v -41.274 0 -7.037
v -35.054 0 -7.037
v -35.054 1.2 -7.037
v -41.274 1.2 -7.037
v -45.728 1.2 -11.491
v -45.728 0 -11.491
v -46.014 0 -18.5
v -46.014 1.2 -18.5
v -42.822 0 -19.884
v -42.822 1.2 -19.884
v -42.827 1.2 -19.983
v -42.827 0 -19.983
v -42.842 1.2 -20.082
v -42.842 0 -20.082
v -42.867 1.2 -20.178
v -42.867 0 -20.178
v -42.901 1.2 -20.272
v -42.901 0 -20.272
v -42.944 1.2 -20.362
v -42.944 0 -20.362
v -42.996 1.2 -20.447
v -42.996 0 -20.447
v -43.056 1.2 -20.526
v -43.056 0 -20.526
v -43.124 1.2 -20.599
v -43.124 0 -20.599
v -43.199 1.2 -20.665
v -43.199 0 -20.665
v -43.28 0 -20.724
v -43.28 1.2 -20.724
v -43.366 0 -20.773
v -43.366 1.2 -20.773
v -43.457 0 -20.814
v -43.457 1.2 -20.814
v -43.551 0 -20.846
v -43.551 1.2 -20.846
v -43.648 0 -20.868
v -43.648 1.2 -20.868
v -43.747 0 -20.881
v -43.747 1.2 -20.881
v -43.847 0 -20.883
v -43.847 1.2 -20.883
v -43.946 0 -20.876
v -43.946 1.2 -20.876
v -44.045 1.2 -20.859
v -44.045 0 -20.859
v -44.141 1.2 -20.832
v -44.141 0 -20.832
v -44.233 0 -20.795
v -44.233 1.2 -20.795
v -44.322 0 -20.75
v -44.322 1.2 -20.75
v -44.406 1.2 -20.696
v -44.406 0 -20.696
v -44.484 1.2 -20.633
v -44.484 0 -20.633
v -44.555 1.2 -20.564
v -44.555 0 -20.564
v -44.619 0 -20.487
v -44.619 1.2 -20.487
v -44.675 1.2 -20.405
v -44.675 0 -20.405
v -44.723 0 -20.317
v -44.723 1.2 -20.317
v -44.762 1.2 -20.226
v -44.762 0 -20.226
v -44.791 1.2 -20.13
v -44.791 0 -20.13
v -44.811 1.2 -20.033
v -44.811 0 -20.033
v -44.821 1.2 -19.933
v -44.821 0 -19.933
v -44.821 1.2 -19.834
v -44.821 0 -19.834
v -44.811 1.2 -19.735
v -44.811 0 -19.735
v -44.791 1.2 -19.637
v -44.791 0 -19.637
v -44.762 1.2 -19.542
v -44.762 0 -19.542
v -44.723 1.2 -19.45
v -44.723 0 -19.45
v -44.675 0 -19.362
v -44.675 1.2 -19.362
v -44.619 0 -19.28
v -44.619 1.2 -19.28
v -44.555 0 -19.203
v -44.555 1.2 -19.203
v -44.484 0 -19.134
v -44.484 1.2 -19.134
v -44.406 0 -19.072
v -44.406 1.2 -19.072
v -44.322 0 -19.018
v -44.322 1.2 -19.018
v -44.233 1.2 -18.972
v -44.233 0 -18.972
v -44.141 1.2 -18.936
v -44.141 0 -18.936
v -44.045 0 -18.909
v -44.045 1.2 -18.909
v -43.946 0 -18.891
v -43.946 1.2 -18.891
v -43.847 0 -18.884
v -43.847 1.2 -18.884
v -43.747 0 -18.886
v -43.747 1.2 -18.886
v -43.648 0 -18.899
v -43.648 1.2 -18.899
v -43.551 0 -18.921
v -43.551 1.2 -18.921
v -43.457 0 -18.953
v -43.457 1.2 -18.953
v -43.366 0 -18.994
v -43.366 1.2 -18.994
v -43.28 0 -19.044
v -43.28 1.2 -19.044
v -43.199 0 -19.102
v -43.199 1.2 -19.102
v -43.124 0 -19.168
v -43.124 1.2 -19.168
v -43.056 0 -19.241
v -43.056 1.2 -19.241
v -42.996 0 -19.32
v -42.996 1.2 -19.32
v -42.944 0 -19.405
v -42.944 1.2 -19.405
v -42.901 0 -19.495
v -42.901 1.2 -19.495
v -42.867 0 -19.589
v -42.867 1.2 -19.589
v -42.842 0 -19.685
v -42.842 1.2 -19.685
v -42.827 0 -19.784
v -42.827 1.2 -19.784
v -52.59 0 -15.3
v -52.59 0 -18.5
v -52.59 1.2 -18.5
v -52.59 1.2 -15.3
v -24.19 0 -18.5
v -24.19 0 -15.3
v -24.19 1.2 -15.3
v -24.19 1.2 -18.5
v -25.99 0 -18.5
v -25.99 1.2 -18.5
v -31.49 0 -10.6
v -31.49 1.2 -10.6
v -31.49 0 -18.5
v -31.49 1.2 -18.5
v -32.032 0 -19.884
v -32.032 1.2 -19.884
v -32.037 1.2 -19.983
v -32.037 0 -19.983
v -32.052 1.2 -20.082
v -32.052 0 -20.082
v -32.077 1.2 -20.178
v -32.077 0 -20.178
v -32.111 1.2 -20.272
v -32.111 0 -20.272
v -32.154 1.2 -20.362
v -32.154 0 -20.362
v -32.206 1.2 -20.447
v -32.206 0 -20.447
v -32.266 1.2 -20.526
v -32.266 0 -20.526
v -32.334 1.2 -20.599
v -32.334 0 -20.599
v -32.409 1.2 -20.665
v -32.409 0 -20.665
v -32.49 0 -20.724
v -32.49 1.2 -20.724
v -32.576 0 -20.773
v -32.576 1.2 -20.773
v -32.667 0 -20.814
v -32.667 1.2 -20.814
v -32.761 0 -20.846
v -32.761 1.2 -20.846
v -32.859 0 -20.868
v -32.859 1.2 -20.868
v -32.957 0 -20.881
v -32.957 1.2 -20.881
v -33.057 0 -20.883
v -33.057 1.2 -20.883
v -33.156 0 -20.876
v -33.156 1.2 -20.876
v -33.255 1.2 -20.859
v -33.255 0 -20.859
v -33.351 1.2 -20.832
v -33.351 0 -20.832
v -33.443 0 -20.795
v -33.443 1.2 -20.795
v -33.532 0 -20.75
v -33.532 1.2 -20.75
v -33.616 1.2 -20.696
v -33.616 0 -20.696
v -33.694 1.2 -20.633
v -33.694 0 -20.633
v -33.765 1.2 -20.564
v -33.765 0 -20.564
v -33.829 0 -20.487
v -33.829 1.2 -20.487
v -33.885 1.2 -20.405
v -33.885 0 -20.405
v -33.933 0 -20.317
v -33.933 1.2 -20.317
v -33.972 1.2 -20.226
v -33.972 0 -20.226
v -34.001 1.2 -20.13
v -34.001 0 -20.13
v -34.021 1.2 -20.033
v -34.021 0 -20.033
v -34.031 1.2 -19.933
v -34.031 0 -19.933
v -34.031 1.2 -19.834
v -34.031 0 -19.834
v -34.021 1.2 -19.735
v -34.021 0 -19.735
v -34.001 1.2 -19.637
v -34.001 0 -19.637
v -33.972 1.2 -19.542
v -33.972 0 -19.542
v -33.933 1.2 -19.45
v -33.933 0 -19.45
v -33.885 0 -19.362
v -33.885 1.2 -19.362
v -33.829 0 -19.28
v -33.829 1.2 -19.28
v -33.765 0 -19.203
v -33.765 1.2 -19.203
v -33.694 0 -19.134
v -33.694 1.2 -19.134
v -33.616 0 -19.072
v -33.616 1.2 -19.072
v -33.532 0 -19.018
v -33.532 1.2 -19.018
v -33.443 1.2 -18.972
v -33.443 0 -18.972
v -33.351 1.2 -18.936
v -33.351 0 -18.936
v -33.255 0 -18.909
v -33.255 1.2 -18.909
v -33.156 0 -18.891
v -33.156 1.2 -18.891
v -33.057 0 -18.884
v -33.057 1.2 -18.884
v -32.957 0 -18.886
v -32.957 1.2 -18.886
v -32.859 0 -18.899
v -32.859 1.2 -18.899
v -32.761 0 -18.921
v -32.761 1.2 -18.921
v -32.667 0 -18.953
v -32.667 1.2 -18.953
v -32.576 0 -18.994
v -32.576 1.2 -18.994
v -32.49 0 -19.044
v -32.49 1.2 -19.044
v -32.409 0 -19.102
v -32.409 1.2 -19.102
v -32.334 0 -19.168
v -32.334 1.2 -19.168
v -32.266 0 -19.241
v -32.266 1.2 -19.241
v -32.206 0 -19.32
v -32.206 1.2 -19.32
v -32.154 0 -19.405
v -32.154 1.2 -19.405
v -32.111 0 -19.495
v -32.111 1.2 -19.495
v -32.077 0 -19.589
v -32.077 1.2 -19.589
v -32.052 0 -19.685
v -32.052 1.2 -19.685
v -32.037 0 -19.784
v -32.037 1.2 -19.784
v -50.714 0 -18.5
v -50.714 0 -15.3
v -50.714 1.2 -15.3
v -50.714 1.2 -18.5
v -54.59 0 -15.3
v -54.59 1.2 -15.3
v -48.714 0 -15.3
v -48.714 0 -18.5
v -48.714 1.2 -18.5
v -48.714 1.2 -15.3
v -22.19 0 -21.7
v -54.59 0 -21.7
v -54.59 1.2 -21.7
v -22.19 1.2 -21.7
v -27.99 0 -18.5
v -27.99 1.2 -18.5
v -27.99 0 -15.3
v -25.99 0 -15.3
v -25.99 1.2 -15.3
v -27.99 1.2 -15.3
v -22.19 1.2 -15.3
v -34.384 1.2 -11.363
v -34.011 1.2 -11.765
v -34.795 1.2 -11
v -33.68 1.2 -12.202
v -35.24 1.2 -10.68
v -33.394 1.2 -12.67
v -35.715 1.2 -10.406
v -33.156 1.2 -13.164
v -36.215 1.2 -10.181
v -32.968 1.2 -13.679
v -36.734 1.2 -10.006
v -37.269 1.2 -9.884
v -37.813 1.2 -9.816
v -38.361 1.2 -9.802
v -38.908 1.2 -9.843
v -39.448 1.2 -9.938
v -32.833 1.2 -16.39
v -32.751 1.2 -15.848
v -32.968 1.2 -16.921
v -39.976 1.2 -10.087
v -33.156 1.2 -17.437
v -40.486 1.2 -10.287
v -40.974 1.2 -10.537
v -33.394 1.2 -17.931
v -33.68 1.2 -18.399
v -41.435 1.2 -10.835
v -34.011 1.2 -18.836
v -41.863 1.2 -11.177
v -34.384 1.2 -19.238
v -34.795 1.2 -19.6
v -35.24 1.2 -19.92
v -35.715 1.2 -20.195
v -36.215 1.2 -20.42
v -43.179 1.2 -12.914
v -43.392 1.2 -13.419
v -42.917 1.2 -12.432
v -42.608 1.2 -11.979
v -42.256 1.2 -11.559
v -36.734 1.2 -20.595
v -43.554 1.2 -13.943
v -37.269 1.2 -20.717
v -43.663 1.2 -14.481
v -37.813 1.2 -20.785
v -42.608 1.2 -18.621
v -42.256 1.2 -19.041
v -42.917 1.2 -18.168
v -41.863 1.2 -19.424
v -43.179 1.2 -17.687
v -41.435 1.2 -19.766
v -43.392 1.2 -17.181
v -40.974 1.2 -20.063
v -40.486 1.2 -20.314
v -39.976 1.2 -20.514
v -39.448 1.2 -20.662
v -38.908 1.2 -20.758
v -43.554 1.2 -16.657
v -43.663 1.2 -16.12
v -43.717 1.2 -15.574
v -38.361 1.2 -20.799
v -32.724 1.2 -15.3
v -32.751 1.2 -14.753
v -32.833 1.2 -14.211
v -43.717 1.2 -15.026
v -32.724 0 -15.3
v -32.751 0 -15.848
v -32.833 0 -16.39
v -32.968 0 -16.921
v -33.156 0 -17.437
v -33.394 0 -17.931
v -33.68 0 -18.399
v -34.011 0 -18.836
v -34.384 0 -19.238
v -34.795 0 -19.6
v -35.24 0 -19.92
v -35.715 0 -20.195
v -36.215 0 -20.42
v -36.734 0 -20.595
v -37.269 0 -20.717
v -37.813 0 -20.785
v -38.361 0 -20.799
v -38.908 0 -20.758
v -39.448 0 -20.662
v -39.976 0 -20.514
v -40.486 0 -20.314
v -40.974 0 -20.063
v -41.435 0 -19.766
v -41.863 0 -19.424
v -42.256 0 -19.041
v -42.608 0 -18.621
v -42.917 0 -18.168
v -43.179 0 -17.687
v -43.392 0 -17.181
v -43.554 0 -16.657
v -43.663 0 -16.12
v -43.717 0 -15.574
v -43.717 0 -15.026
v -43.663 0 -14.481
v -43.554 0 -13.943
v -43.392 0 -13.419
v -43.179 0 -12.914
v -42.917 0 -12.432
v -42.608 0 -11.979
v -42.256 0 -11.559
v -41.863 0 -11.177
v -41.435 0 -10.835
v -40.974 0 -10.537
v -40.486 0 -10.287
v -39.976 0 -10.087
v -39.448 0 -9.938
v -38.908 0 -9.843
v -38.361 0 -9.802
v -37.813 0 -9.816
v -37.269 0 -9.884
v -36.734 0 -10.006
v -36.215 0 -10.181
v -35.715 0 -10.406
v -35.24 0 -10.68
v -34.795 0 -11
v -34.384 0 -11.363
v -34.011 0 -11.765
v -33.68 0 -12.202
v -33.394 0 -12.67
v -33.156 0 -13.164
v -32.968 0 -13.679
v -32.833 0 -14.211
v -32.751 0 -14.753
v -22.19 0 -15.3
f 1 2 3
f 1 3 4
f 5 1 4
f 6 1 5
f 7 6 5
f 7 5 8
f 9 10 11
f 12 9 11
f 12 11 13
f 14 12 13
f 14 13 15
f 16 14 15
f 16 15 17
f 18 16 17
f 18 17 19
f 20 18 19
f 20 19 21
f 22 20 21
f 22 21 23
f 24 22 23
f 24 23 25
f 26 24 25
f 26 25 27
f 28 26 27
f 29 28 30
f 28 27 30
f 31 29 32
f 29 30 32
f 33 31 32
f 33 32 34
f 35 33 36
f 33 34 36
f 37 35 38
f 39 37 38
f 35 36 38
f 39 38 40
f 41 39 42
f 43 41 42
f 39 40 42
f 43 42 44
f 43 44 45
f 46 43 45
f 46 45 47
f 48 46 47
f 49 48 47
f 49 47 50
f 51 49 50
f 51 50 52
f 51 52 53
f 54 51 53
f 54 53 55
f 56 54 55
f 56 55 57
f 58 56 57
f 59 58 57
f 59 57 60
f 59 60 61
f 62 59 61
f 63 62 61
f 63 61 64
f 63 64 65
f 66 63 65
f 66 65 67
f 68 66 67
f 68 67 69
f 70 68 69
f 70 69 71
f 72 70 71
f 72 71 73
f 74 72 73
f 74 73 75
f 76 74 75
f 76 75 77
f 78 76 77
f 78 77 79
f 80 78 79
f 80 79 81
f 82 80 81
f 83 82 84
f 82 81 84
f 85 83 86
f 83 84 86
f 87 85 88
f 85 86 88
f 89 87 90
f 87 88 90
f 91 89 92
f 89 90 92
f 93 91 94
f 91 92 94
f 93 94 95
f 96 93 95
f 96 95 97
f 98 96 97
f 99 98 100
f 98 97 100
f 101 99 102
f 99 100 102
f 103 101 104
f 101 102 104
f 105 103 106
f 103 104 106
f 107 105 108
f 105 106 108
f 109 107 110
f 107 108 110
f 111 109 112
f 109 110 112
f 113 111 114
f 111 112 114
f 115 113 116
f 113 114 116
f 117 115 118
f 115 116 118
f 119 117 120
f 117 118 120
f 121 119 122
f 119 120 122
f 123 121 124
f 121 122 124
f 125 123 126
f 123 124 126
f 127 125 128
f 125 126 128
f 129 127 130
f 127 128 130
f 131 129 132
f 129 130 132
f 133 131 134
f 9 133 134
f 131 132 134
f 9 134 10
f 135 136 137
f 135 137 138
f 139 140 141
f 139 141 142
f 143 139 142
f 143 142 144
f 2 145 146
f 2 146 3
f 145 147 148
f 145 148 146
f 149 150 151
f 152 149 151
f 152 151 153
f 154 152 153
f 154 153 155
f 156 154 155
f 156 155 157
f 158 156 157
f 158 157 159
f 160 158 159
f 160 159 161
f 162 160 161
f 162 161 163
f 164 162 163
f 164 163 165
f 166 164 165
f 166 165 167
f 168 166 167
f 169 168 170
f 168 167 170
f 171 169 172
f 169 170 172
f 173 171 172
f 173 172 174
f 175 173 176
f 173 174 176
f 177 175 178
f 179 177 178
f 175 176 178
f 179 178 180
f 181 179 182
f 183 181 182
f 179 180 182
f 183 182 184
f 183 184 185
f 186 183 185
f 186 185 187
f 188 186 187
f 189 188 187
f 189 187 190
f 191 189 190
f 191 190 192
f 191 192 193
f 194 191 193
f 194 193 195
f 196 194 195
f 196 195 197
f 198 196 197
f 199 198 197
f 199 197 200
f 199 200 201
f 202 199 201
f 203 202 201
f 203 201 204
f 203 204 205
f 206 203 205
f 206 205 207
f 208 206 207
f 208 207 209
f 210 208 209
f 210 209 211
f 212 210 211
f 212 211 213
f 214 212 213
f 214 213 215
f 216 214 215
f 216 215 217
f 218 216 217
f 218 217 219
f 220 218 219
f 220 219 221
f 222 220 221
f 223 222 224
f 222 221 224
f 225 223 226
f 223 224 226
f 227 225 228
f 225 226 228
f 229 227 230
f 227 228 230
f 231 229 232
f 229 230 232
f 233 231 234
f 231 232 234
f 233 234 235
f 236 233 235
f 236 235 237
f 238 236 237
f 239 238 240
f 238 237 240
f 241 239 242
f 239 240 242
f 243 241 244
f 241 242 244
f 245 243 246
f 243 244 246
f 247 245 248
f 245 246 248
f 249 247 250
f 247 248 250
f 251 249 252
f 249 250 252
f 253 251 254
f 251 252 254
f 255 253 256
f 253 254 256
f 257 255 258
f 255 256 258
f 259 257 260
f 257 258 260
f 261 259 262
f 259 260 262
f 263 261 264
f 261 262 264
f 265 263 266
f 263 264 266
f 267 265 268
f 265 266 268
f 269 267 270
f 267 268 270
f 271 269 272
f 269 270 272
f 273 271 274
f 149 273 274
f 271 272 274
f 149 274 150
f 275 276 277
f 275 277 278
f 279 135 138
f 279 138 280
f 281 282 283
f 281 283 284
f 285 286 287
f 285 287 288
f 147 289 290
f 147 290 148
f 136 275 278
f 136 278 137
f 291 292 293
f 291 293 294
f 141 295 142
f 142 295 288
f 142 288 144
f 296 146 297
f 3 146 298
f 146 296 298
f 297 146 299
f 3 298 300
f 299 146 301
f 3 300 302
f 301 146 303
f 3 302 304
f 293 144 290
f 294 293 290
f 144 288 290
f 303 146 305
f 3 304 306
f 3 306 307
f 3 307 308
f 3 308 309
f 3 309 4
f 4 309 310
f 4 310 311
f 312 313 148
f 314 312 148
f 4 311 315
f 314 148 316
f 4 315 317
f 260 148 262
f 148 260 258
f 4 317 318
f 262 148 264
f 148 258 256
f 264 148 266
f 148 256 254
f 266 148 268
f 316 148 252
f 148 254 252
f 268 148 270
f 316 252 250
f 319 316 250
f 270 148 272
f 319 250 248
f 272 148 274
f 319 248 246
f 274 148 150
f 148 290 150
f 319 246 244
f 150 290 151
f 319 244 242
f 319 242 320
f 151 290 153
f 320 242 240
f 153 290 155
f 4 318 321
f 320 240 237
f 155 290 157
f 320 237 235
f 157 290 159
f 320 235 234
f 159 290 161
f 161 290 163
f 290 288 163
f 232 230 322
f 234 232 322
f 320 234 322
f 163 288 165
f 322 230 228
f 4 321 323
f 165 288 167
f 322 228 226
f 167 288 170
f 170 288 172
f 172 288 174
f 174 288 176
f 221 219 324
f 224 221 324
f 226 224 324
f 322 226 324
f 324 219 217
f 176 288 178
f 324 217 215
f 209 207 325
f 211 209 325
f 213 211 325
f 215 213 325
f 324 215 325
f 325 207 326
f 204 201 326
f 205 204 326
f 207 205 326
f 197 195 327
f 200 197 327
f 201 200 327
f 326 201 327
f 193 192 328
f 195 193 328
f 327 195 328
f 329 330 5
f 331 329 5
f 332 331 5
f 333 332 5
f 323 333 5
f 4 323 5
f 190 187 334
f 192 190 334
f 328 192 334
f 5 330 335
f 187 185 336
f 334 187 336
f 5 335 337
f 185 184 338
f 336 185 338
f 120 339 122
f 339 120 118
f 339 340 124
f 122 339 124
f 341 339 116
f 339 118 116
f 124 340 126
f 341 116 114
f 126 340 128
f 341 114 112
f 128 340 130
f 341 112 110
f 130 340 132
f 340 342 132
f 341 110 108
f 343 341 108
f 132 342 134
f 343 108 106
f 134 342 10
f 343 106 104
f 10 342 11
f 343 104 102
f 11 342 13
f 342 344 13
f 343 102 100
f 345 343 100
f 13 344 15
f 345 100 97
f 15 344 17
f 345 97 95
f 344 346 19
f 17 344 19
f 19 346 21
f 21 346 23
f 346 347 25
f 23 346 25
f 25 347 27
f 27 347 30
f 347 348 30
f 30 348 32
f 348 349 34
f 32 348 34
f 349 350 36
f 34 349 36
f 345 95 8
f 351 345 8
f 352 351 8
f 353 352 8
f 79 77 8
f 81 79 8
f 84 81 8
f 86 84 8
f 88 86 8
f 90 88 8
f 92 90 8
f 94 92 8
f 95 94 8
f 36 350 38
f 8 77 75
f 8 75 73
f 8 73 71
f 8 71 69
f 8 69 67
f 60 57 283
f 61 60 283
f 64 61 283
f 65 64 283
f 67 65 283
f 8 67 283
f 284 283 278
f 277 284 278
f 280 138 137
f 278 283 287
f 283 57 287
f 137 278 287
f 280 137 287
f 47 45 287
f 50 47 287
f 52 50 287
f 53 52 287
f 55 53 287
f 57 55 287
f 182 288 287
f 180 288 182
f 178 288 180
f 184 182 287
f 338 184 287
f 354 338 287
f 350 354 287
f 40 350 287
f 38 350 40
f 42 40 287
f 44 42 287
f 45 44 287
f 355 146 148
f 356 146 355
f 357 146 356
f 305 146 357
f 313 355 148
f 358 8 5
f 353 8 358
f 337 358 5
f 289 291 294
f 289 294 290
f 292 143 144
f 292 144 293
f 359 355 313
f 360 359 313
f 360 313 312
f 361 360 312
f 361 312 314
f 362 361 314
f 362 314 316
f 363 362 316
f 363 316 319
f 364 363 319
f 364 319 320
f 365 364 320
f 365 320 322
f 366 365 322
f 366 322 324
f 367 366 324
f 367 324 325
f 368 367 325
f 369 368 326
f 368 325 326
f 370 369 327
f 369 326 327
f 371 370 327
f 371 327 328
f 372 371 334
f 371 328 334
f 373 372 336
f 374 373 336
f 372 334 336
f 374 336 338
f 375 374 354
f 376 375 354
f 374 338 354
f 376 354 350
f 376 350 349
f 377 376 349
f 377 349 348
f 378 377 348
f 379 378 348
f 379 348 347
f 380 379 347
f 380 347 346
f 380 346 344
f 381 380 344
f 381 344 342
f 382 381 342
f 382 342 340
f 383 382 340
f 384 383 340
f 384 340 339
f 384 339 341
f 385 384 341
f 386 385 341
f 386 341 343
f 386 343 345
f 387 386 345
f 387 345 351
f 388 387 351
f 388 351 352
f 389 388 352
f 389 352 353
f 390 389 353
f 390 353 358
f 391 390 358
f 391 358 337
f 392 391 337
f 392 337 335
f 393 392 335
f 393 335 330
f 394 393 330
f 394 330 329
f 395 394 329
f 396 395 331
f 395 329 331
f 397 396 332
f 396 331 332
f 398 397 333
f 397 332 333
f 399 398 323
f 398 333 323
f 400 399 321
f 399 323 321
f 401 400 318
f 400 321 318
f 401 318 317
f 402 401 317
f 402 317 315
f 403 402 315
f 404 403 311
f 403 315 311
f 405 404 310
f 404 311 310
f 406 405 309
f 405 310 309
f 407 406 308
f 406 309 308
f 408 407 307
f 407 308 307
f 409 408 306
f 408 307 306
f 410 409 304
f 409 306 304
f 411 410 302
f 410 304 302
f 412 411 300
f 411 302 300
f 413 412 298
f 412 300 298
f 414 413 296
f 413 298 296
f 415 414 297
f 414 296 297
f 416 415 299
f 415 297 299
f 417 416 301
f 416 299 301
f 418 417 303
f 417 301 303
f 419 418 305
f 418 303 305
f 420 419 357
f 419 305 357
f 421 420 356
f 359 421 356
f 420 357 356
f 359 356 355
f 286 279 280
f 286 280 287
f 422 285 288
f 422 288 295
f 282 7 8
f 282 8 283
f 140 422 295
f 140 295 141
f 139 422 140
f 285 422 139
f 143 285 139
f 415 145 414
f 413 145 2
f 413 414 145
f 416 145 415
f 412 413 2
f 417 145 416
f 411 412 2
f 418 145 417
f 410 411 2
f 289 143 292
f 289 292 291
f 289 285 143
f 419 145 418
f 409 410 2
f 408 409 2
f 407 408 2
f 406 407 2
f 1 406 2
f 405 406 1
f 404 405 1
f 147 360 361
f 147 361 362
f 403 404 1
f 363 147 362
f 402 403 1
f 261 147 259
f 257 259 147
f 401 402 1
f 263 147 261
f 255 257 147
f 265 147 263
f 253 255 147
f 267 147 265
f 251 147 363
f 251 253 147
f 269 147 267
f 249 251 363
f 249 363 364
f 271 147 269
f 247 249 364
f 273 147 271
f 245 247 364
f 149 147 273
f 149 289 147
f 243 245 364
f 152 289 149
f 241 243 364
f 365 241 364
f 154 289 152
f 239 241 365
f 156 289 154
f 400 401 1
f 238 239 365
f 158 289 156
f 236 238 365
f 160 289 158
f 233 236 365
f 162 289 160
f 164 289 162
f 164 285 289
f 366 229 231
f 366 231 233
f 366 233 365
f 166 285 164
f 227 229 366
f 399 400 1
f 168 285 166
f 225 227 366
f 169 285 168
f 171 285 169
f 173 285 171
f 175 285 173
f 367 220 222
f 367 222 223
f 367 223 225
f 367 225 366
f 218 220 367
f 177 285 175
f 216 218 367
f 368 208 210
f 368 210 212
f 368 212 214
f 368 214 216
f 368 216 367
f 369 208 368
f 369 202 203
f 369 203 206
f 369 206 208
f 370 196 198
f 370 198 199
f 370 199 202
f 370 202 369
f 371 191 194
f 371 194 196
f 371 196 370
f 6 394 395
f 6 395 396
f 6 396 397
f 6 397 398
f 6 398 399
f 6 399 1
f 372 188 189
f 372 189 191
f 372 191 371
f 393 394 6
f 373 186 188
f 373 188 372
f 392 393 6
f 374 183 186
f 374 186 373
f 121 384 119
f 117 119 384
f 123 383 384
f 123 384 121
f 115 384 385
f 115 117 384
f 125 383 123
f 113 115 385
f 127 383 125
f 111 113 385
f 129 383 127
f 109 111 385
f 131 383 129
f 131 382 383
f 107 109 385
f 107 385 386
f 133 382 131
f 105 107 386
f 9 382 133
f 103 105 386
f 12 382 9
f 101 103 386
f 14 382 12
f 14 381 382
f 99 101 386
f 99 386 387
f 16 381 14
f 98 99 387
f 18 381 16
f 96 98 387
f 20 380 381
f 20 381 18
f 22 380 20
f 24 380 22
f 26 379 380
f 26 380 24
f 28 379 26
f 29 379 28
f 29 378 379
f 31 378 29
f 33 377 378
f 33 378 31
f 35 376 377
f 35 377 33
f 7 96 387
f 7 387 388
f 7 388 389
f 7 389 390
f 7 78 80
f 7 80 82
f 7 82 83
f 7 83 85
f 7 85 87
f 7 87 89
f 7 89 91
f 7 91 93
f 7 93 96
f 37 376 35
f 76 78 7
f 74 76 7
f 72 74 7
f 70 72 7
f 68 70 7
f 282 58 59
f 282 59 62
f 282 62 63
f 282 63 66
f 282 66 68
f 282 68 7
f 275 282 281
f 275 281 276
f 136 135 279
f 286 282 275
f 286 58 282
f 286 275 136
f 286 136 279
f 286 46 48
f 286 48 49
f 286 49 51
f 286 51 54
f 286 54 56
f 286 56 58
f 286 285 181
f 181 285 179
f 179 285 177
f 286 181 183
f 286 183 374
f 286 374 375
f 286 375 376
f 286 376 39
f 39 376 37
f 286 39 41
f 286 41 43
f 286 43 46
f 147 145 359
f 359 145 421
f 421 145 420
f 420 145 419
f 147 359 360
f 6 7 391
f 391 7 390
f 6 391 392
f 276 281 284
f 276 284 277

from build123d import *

# Parameters (mm, degrees)
BOSS_EXTRUDE1_DEPTH = 1.2
CUT_EXTRUDE2_REACH  = 3.2
SKETCH3_R           = 1
SKETCH3_R_2         = 5.5


with BuildPart() as part:
    # Sketch1 → Boss-Extrude1 (new body)
    with BuildSketch(Plane(origin=(0, 0, 0), x_dir=(1, 0, 0), z_dir=(0, 1, 0))):
        Polygon((-54.589869364, 21.700331248), (-22.189869364, 21.700331248), (-22.189869364, 15.300331248), (-24.189869364, 15.300331248), (-24.189869364, 18.500331248), (-25.989869364, 18.500331248), (-25.989869364, 15.300331248), (-27.989869364, 15.300331248), (-27.989869364, 18.500331248), (-31.489869364, 18.500331248), (-31.489869364, 10.600331248), (-35.053687541, 7.036513071), (-41.273687541, 7.036513071), (-45.728460263, 11.491285792), (-46.013981929, 18.500331248), (-48.713981929, 18.500331248), (-48.713981929, 15.300331248), (-50.713981929, 15.300331248), (-50.713981929, 18.500331248), (-52.589869364, 18.500331248), (-52.589869364, 15.300331248), (-54.589869364, 15.300331248), align=None)
    extrude(amount=BOSS_EXTRUDE1_DEPTH)

    # Sketch3 → Cut-Extrude2 (cut, up to next)
    with BuildSketch(Plane(origin=(0, 1.2, 0), x_dir=(1, 0, 0), z_dir=(0, 1, 0)), mode=Mode.PRIVATE) as cut_extrude2_sk1:
        with Locations((-43.822096549, 19.883607228)):
            Circle(SKETCH3_R)
    cut_extrude2_tool1 = extrude(cut_extrude2_sk1.sketch, amount=-CUT_EXTRUDE2_REACH, mode=Mode.PRIVATE) & part.part
    add(cut_extrude2_tool1.solids().sort_by_distance((-43.822097, 1.2, -19.883607))[0], mode=Mode.SUBTRACT)
    # Sketch3 → Cut-Extrude2 (cut, up to next)
    with BuildSketch(Plane(origin=(0, 1.2, 0), x_dir=(1, 0, 0), z_dir=(0, 1, 0)), mode=Mode.PRIVATE) as cut_extrude2_sk2:
        with Locations((-33.032153908, 19.883607228)):
            Circle(SKETCH3_R)
    cut_extrude2_tool2 = extrude(cut_extrude2_sk2.sketch, amount=-CUT_EXTRUDE2_REACH, mode=Mode.PRIVATE) & part.part
    add(cut_extrude2_tool2.solids().sort_by_distance((-33.032154, 1.2, -19.883607))[0], mode=Mode.SUBTRACT)
    # Sketch3 → Cut-Extrude2 (cut, up to next)
    with BuildSketch(Plane(origin=(0, 1.2, 0), x_dir=(1, 0, 0), z_dir=(0, 1, 0)), mode=Mode.PRIVATE) as cut_extrude2_sk3:
        with Locations((-38.224033721, 15.300331248)):
            Circle(SKETCH3_R_2)
    cut_extrude2_tool3 = extrude(cut_extrude2_sk3.sketch, amount=-CUT_EXTRUDE2_REACH, mode=Mode.PRIVATE) & part.part
    add(cut_extrude2_tool3.solids().sort_by_distance((-38.224034, 1.2, -15.300331))[0], mode=Mode.SUBTRACT)


solid = part.part
